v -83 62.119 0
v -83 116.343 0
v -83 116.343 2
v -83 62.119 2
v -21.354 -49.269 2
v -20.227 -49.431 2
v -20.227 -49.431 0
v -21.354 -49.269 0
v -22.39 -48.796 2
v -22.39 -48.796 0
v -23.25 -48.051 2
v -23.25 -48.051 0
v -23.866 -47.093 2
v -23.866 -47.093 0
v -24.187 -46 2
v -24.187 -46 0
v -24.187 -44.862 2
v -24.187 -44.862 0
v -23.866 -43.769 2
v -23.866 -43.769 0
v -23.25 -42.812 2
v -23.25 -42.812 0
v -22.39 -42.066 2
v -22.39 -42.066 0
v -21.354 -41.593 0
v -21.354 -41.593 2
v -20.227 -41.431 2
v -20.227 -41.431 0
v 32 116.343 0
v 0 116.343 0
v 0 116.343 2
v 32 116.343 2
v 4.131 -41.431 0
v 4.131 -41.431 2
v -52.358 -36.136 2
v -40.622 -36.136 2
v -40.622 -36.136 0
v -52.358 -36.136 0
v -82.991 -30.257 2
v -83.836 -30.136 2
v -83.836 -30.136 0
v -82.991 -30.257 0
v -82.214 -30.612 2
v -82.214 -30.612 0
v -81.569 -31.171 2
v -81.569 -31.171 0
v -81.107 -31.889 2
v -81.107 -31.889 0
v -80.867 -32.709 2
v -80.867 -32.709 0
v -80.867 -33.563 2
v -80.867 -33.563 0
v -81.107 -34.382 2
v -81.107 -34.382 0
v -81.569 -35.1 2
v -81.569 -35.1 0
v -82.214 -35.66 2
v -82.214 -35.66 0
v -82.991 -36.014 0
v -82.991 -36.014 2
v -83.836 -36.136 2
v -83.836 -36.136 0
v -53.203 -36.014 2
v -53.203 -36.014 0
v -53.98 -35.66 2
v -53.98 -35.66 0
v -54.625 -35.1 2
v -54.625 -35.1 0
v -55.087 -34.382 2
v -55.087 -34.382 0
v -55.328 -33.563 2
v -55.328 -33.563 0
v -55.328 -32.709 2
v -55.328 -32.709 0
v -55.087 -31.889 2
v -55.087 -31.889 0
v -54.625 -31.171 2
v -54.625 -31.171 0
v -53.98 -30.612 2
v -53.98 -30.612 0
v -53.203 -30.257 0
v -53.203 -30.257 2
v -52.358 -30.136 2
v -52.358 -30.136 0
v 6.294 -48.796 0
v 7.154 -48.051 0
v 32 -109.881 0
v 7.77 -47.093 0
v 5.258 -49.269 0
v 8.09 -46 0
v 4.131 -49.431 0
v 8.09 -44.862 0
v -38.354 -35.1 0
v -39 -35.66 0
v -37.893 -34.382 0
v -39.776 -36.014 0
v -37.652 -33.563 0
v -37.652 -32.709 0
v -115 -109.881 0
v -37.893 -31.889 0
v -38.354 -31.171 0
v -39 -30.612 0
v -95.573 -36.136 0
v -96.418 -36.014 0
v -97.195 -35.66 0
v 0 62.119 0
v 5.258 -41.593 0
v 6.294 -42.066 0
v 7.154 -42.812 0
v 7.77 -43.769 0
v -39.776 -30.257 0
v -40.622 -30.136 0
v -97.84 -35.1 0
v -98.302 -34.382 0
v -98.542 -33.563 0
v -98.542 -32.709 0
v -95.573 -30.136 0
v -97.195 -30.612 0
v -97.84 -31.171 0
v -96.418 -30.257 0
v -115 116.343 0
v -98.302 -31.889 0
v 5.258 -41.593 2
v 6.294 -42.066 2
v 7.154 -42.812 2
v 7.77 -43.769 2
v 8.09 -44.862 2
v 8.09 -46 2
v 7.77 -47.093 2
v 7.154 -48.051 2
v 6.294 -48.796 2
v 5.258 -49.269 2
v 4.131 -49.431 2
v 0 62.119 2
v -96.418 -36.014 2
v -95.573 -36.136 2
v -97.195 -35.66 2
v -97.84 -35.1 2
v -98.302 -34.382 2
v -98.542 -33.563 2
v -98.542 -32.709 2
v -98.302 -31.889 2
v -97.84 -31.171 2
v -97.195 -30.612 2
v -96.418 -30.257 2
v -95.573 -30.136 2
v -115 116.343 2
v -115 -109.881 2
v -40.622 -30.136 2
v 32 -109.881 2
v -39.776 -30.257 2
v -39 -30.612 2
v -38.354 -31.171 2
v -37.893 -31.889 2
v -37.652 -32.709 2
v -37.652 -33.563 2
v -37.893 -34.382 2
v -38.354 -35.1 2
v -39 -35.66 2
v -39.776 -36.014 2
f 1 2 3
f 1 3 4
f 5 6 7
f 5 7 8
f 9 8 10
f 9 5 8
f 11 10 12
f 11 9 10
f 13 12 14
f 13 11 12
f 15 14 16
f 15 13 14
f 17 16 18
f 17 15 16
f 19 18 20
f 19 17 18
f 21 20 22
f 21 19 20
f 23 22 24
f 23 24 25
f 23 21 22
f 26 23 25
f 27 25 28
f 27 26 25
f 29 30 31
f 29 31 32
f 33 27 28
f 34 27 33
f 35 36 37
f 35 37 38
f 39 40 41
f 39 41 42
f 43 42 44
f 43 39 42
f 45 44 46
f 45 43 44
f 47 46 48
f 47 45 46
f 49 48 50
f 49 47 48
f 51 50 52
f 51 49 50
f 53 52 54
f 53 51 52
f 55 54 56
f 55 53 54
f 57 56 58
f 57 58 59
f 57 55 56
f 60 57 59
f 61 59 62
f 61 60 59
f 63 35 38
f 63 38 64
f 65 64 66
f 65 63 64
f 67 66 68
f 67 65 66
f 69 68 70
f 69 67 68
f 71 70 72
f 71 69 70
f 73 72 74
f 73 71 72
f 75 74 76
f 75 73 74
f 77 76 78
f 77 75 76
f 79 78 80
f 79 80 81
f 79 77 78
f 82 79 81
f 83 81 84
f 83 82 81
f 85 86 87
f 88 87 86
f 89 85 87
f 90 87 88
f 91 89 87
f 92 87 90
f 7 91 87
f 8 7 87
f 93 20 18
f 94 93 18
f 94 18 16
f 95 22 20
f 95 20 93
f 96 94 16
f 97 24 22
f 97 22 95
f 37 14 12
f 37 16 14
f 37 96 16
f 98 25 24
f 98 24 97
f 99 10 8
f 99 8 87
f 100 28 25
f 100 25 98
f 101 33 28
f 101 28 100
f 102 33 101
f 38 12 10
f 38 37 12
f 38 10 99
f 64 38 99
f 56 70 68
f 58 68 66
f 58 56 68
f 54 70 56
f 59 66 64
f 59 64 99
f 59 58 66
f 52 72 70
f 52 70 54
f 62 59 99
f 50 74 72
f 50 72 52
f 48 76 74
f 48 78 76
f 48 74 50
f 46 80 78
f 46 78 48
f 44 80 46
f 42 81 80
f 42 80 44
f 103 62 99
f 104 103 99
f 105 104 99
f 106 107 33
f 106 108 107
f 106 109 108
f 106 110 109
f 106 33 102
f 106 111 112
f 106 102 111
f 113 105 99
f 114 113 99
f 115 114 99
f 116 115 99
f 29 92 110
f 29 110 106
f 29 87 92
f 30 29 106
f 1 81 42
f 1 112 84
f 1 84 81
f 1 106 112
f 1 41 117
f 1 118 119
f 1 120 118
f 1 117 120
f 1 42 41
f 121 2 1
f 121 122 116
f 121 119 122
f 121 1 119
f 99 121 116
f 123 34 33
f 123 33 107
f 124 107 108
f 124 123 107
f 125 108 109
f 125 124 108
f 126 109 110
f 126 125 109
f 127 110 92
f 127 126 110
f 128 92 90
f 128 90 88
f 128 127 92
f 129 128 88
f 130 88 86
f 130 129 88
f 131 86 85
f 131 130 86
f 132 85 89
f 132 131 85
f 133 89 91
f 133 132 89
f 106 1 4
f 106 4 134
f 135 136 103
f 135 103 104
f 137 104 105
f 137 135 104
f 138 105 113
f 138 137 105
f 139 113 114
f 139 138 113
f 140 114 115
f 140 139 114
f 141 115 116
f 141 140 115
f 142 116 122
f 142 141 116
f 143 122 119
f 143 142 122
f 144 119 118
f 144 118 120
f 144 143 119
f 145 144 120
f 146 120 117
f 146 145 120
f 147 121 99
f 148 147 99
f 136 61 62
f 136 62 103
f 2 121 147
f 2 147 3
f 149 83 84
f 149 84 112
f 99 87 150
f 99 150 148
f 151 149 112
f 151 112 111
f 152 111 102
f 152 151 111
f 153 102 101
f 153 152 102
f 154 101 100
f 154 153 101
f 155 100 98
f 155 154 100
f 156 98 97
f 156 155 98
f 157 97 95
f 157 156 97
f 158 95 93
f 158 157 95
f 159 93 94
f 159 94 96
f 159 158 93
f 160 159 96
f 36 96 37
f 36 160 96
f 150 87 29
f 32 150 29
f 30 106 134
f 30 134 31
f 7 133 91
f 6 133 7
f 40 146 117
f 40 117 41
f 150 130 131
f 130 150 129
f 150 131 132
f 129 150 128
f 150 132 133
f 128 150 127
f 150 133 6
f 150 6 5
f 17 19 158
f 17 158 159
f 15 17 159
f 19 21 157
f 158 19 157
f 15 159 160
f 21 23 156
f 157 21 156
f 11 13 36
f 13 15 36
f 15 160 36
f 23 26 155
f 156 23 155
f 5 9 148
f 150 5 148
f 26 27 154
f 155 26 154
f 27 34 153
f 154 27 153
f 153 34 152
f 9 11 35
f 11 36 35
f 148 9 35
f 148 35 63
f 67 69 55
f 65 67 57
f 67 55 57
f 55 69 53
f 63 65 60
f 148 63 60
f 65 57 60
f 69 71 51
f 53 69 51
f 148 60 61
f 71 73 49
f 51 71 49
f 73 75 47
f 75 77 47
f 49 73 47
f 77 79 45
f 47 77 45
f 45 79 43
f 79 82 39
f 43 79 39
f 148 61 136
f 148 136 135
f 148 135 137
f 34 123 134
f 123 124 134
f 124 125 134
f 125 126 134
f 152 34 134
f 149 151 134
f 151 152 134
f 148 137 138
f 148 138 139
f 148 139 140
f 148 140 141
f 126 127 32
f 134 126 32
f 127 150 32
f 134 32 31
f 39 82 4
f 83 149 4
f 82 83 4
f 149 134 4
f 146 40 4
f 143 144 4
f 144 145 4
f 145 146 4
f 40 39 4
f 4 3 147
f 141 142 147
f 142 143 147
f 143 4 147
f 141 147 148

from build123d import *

# Parameters (mm, degrees)
EXTRUDE_1_DEPTH     = 2
CUT_EXTRUDE_1_DEPTH = 2


with BuildPart() as part:
    # 草图1 → 凸台-拉伸1 (new body)
    with BuildSketch(Plane.XY):
        Polygon((-83, 62.119161838), (0, 62.119161838), (0, 116.342711697), (32, 116.342711697), (32, 62.119161838), (32, -109.880838162), (-115, -109.880838162), (-115, 62.119161838), (-115, 116.342711697), (-83, 116.342711697), align=None)
    extrude(amount=EXTRUDE_1_DEPTH)

    # 草图2 → 切除-拉伸1 (cut)
    with BuildSketch(Plane.XY.offset(2)):
        with BuildLine():
            Line((-20.227487309, -41.431118444), (4.13099273, -41.431118444))
            ThreePointArc((4.13099273, -41.431118444), (8.13099273, -45.431118444), (4.13099273, -49.431118444))
            Line((4.13099273, -49.431118444), (-20.227487309, -49.431118444))
            ThreePointArc((-20.227487309, -49.431118444), (-24.227487309, -45.431118444), (-20.227487309, -41.431118444))
        make_face()
        with BuildLine():
            Line((-95.572678874, -30.135740054), (-83.83609572, -30.135740054))
            ThreePointArc((-83.83609572, -30.135740054), (-80.83609572, -33.135740054), (-83.83609572, -36.135740054))
            Line((-83.83609572, -36.135740054), (-95.572678874, -36.135740054))
            ThreePointArc((-95.572678874, -36.135740054), (-98.572678874, -33.135740054), (-95.572678874, -30.135740054))
        make_face()
        with BuildLine():
            Line((-52.358181563, -30.135740054), (-40.621598408, -30.135740054))
            ThreePointArc((-40.621598408, -30.135740054), (-37.621598408, -33.135740054), (-40.621598408, -36.135740054))
            Line((-40.621598408, -36.135740054), (-52.358181563, -36.135740054))
            ThreePointArc((-52.358181563, -36.135740054), (-55.358181563, -33.135740054), (-52.358181563, -30.135740054))
        make_face()
    extrude(amount=-CUT_EXTRUDE_1_DEPTH, mode=Mode.SUBTRACT)


solid = part.part
